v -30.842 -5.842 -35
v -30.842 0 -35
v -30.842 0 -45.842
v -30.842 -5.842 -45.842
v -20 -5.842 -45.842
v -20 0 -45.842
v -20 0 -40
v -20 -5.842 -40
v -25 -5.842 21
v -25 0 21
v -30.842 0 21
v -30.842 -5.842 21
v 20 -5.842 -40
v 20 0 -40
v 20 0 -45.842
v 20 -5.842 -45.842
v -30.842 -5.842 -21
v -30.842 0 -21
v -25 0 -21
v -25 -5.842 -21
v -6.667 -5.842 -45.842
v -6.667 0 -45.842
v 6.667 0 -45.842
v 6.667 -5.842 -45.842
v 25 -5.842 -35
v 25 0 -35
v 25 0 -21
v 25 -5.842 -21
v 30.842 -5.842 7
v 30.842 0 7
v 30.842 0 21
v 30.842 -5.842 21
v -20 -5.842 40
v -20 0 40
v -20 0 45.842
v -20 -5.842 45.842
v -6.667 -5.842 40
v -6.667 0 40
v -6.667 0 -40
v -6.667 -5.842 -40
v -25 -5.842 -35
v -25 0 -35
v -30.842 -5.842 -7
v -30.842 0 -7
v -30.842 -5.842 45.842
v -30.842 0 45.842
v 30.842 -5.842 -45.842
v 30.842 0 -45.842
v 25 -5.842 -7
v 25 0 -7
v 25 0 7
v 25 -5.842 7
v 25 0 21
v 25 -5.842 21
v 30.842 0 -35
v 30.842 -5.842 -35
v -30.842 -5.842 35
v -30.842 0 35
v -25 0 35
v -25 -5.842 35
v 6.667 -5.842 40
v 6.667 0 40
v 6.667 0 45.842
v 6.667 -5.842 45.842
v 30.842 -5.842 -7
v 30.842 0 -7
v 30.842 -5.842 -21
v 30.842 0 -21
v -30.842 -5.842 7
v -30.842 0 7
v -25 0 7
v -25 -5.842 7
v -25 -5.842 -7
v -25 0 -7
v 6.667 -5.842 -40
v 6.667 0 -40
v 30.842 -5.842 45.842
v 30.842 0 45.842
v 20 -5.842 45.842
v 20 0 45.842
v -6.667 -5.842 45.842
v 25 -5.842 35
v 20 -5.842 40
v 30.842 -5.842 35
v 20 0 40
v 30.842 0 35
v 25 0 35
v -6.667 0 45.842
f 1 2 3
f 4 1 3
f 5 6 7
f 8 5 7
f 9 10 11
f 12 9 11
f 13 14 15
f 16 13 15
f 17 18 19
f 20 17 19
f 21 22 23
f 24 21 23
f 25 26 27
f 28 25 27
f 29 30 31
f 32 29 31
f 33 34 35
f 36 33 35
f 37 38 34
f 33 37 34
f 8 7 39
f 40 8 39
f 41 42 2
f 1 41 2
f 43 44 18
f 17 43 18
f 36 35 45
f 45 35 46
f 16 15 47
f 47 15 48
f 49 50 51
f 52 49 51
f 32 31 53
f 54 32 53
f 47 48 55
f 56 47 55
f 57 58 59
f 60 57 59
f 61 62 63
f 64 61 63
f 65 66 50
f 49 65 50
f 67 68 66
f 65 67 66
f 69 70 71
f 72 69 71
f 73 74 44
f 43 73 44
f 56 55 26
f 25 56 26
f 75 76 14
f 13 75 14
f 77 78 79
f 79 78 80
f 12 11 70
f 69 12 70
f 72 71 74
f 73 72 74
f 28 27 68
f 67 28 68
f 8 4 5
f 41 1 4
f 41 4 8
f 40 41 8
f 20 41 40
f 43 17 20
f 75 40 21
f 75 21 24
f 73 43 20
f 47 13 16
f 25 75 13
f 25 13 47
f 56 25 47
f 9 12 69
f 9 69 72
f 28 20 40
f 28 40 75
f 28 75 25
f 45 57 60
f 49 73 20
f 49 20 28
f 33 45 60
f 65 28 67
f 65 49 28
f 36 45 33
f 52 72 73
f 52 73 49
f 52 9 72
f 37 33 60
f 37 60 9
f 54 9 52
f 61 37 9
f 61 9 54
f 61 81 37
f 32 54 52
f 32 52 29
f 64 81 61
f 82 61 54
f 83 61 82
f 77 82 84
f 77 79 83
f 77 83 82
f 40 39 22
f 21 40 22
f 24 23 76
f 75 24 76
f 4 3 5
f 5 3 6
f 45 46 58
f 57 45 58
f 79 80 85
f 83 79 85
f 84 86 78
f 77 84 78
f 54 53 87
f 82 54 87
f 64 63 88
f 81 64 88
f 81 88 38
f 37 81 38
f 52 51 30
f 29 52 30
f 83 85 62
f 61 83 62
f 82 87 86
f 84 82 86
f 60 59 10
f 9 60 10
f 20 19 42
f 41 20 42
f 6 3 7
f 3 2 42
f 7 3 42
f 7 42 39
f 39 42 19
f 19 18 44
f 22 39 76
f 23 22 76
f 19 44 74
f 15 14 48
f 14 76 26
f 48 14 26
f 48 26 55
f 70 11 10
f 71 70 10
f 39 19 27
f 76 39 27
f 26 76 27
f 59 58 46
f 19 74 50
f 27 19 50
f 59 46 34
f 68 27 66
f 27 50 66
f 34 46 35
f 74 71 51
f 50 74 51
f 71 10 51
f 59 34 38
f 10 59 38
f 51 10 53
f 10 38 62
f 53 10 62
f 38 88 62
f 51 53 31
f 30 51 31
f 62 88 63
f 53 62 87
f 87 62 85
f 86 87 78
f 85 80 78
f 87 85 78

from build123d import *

# Parameters (mm, degrees)
F1_DEPTH = 5.842


with BuildPart() as f1:
    # F0 (on Front) → F1 (new body)
    with BuildSketch(Plane.XZ):
        Polygon((-20, -45.842), (-20, -40), (-6.666667, -40), (-6.666667, -45.842), (6.666667, -45.842), (6.666667, -40), (20, -40), (20, -45.842), (30.842, -45.842), (30.842, -35), (25, -35), (25, -21), (30.842, -21), (30.842, -7), (25, -7), (25, 7), (30.842, 7), (30.842, 21), (25, 21), (25, 35), (30.842, 35), (30.842, 45.842), (20, 45.842), (20, 40), (6.666667, 40), (6.666667, 45.842), (-6.666667, 45.842), (-6.666667, 40), (-20, 40), (-20, 45.842), (-30.842, 45.842), (-30.842, 35), (-25, 35), (-25, 21), (-30.842, 21), (-30.842, 7), (-25, 7), (-25, -7), (-30.842, -7), (-30.842, -21), (-25, -21), (-25, -35), (-30.842, -35), (-30.842, -45.842), align=None)
    extrude(amount=F1_DEPTH)


solid = f1.part
